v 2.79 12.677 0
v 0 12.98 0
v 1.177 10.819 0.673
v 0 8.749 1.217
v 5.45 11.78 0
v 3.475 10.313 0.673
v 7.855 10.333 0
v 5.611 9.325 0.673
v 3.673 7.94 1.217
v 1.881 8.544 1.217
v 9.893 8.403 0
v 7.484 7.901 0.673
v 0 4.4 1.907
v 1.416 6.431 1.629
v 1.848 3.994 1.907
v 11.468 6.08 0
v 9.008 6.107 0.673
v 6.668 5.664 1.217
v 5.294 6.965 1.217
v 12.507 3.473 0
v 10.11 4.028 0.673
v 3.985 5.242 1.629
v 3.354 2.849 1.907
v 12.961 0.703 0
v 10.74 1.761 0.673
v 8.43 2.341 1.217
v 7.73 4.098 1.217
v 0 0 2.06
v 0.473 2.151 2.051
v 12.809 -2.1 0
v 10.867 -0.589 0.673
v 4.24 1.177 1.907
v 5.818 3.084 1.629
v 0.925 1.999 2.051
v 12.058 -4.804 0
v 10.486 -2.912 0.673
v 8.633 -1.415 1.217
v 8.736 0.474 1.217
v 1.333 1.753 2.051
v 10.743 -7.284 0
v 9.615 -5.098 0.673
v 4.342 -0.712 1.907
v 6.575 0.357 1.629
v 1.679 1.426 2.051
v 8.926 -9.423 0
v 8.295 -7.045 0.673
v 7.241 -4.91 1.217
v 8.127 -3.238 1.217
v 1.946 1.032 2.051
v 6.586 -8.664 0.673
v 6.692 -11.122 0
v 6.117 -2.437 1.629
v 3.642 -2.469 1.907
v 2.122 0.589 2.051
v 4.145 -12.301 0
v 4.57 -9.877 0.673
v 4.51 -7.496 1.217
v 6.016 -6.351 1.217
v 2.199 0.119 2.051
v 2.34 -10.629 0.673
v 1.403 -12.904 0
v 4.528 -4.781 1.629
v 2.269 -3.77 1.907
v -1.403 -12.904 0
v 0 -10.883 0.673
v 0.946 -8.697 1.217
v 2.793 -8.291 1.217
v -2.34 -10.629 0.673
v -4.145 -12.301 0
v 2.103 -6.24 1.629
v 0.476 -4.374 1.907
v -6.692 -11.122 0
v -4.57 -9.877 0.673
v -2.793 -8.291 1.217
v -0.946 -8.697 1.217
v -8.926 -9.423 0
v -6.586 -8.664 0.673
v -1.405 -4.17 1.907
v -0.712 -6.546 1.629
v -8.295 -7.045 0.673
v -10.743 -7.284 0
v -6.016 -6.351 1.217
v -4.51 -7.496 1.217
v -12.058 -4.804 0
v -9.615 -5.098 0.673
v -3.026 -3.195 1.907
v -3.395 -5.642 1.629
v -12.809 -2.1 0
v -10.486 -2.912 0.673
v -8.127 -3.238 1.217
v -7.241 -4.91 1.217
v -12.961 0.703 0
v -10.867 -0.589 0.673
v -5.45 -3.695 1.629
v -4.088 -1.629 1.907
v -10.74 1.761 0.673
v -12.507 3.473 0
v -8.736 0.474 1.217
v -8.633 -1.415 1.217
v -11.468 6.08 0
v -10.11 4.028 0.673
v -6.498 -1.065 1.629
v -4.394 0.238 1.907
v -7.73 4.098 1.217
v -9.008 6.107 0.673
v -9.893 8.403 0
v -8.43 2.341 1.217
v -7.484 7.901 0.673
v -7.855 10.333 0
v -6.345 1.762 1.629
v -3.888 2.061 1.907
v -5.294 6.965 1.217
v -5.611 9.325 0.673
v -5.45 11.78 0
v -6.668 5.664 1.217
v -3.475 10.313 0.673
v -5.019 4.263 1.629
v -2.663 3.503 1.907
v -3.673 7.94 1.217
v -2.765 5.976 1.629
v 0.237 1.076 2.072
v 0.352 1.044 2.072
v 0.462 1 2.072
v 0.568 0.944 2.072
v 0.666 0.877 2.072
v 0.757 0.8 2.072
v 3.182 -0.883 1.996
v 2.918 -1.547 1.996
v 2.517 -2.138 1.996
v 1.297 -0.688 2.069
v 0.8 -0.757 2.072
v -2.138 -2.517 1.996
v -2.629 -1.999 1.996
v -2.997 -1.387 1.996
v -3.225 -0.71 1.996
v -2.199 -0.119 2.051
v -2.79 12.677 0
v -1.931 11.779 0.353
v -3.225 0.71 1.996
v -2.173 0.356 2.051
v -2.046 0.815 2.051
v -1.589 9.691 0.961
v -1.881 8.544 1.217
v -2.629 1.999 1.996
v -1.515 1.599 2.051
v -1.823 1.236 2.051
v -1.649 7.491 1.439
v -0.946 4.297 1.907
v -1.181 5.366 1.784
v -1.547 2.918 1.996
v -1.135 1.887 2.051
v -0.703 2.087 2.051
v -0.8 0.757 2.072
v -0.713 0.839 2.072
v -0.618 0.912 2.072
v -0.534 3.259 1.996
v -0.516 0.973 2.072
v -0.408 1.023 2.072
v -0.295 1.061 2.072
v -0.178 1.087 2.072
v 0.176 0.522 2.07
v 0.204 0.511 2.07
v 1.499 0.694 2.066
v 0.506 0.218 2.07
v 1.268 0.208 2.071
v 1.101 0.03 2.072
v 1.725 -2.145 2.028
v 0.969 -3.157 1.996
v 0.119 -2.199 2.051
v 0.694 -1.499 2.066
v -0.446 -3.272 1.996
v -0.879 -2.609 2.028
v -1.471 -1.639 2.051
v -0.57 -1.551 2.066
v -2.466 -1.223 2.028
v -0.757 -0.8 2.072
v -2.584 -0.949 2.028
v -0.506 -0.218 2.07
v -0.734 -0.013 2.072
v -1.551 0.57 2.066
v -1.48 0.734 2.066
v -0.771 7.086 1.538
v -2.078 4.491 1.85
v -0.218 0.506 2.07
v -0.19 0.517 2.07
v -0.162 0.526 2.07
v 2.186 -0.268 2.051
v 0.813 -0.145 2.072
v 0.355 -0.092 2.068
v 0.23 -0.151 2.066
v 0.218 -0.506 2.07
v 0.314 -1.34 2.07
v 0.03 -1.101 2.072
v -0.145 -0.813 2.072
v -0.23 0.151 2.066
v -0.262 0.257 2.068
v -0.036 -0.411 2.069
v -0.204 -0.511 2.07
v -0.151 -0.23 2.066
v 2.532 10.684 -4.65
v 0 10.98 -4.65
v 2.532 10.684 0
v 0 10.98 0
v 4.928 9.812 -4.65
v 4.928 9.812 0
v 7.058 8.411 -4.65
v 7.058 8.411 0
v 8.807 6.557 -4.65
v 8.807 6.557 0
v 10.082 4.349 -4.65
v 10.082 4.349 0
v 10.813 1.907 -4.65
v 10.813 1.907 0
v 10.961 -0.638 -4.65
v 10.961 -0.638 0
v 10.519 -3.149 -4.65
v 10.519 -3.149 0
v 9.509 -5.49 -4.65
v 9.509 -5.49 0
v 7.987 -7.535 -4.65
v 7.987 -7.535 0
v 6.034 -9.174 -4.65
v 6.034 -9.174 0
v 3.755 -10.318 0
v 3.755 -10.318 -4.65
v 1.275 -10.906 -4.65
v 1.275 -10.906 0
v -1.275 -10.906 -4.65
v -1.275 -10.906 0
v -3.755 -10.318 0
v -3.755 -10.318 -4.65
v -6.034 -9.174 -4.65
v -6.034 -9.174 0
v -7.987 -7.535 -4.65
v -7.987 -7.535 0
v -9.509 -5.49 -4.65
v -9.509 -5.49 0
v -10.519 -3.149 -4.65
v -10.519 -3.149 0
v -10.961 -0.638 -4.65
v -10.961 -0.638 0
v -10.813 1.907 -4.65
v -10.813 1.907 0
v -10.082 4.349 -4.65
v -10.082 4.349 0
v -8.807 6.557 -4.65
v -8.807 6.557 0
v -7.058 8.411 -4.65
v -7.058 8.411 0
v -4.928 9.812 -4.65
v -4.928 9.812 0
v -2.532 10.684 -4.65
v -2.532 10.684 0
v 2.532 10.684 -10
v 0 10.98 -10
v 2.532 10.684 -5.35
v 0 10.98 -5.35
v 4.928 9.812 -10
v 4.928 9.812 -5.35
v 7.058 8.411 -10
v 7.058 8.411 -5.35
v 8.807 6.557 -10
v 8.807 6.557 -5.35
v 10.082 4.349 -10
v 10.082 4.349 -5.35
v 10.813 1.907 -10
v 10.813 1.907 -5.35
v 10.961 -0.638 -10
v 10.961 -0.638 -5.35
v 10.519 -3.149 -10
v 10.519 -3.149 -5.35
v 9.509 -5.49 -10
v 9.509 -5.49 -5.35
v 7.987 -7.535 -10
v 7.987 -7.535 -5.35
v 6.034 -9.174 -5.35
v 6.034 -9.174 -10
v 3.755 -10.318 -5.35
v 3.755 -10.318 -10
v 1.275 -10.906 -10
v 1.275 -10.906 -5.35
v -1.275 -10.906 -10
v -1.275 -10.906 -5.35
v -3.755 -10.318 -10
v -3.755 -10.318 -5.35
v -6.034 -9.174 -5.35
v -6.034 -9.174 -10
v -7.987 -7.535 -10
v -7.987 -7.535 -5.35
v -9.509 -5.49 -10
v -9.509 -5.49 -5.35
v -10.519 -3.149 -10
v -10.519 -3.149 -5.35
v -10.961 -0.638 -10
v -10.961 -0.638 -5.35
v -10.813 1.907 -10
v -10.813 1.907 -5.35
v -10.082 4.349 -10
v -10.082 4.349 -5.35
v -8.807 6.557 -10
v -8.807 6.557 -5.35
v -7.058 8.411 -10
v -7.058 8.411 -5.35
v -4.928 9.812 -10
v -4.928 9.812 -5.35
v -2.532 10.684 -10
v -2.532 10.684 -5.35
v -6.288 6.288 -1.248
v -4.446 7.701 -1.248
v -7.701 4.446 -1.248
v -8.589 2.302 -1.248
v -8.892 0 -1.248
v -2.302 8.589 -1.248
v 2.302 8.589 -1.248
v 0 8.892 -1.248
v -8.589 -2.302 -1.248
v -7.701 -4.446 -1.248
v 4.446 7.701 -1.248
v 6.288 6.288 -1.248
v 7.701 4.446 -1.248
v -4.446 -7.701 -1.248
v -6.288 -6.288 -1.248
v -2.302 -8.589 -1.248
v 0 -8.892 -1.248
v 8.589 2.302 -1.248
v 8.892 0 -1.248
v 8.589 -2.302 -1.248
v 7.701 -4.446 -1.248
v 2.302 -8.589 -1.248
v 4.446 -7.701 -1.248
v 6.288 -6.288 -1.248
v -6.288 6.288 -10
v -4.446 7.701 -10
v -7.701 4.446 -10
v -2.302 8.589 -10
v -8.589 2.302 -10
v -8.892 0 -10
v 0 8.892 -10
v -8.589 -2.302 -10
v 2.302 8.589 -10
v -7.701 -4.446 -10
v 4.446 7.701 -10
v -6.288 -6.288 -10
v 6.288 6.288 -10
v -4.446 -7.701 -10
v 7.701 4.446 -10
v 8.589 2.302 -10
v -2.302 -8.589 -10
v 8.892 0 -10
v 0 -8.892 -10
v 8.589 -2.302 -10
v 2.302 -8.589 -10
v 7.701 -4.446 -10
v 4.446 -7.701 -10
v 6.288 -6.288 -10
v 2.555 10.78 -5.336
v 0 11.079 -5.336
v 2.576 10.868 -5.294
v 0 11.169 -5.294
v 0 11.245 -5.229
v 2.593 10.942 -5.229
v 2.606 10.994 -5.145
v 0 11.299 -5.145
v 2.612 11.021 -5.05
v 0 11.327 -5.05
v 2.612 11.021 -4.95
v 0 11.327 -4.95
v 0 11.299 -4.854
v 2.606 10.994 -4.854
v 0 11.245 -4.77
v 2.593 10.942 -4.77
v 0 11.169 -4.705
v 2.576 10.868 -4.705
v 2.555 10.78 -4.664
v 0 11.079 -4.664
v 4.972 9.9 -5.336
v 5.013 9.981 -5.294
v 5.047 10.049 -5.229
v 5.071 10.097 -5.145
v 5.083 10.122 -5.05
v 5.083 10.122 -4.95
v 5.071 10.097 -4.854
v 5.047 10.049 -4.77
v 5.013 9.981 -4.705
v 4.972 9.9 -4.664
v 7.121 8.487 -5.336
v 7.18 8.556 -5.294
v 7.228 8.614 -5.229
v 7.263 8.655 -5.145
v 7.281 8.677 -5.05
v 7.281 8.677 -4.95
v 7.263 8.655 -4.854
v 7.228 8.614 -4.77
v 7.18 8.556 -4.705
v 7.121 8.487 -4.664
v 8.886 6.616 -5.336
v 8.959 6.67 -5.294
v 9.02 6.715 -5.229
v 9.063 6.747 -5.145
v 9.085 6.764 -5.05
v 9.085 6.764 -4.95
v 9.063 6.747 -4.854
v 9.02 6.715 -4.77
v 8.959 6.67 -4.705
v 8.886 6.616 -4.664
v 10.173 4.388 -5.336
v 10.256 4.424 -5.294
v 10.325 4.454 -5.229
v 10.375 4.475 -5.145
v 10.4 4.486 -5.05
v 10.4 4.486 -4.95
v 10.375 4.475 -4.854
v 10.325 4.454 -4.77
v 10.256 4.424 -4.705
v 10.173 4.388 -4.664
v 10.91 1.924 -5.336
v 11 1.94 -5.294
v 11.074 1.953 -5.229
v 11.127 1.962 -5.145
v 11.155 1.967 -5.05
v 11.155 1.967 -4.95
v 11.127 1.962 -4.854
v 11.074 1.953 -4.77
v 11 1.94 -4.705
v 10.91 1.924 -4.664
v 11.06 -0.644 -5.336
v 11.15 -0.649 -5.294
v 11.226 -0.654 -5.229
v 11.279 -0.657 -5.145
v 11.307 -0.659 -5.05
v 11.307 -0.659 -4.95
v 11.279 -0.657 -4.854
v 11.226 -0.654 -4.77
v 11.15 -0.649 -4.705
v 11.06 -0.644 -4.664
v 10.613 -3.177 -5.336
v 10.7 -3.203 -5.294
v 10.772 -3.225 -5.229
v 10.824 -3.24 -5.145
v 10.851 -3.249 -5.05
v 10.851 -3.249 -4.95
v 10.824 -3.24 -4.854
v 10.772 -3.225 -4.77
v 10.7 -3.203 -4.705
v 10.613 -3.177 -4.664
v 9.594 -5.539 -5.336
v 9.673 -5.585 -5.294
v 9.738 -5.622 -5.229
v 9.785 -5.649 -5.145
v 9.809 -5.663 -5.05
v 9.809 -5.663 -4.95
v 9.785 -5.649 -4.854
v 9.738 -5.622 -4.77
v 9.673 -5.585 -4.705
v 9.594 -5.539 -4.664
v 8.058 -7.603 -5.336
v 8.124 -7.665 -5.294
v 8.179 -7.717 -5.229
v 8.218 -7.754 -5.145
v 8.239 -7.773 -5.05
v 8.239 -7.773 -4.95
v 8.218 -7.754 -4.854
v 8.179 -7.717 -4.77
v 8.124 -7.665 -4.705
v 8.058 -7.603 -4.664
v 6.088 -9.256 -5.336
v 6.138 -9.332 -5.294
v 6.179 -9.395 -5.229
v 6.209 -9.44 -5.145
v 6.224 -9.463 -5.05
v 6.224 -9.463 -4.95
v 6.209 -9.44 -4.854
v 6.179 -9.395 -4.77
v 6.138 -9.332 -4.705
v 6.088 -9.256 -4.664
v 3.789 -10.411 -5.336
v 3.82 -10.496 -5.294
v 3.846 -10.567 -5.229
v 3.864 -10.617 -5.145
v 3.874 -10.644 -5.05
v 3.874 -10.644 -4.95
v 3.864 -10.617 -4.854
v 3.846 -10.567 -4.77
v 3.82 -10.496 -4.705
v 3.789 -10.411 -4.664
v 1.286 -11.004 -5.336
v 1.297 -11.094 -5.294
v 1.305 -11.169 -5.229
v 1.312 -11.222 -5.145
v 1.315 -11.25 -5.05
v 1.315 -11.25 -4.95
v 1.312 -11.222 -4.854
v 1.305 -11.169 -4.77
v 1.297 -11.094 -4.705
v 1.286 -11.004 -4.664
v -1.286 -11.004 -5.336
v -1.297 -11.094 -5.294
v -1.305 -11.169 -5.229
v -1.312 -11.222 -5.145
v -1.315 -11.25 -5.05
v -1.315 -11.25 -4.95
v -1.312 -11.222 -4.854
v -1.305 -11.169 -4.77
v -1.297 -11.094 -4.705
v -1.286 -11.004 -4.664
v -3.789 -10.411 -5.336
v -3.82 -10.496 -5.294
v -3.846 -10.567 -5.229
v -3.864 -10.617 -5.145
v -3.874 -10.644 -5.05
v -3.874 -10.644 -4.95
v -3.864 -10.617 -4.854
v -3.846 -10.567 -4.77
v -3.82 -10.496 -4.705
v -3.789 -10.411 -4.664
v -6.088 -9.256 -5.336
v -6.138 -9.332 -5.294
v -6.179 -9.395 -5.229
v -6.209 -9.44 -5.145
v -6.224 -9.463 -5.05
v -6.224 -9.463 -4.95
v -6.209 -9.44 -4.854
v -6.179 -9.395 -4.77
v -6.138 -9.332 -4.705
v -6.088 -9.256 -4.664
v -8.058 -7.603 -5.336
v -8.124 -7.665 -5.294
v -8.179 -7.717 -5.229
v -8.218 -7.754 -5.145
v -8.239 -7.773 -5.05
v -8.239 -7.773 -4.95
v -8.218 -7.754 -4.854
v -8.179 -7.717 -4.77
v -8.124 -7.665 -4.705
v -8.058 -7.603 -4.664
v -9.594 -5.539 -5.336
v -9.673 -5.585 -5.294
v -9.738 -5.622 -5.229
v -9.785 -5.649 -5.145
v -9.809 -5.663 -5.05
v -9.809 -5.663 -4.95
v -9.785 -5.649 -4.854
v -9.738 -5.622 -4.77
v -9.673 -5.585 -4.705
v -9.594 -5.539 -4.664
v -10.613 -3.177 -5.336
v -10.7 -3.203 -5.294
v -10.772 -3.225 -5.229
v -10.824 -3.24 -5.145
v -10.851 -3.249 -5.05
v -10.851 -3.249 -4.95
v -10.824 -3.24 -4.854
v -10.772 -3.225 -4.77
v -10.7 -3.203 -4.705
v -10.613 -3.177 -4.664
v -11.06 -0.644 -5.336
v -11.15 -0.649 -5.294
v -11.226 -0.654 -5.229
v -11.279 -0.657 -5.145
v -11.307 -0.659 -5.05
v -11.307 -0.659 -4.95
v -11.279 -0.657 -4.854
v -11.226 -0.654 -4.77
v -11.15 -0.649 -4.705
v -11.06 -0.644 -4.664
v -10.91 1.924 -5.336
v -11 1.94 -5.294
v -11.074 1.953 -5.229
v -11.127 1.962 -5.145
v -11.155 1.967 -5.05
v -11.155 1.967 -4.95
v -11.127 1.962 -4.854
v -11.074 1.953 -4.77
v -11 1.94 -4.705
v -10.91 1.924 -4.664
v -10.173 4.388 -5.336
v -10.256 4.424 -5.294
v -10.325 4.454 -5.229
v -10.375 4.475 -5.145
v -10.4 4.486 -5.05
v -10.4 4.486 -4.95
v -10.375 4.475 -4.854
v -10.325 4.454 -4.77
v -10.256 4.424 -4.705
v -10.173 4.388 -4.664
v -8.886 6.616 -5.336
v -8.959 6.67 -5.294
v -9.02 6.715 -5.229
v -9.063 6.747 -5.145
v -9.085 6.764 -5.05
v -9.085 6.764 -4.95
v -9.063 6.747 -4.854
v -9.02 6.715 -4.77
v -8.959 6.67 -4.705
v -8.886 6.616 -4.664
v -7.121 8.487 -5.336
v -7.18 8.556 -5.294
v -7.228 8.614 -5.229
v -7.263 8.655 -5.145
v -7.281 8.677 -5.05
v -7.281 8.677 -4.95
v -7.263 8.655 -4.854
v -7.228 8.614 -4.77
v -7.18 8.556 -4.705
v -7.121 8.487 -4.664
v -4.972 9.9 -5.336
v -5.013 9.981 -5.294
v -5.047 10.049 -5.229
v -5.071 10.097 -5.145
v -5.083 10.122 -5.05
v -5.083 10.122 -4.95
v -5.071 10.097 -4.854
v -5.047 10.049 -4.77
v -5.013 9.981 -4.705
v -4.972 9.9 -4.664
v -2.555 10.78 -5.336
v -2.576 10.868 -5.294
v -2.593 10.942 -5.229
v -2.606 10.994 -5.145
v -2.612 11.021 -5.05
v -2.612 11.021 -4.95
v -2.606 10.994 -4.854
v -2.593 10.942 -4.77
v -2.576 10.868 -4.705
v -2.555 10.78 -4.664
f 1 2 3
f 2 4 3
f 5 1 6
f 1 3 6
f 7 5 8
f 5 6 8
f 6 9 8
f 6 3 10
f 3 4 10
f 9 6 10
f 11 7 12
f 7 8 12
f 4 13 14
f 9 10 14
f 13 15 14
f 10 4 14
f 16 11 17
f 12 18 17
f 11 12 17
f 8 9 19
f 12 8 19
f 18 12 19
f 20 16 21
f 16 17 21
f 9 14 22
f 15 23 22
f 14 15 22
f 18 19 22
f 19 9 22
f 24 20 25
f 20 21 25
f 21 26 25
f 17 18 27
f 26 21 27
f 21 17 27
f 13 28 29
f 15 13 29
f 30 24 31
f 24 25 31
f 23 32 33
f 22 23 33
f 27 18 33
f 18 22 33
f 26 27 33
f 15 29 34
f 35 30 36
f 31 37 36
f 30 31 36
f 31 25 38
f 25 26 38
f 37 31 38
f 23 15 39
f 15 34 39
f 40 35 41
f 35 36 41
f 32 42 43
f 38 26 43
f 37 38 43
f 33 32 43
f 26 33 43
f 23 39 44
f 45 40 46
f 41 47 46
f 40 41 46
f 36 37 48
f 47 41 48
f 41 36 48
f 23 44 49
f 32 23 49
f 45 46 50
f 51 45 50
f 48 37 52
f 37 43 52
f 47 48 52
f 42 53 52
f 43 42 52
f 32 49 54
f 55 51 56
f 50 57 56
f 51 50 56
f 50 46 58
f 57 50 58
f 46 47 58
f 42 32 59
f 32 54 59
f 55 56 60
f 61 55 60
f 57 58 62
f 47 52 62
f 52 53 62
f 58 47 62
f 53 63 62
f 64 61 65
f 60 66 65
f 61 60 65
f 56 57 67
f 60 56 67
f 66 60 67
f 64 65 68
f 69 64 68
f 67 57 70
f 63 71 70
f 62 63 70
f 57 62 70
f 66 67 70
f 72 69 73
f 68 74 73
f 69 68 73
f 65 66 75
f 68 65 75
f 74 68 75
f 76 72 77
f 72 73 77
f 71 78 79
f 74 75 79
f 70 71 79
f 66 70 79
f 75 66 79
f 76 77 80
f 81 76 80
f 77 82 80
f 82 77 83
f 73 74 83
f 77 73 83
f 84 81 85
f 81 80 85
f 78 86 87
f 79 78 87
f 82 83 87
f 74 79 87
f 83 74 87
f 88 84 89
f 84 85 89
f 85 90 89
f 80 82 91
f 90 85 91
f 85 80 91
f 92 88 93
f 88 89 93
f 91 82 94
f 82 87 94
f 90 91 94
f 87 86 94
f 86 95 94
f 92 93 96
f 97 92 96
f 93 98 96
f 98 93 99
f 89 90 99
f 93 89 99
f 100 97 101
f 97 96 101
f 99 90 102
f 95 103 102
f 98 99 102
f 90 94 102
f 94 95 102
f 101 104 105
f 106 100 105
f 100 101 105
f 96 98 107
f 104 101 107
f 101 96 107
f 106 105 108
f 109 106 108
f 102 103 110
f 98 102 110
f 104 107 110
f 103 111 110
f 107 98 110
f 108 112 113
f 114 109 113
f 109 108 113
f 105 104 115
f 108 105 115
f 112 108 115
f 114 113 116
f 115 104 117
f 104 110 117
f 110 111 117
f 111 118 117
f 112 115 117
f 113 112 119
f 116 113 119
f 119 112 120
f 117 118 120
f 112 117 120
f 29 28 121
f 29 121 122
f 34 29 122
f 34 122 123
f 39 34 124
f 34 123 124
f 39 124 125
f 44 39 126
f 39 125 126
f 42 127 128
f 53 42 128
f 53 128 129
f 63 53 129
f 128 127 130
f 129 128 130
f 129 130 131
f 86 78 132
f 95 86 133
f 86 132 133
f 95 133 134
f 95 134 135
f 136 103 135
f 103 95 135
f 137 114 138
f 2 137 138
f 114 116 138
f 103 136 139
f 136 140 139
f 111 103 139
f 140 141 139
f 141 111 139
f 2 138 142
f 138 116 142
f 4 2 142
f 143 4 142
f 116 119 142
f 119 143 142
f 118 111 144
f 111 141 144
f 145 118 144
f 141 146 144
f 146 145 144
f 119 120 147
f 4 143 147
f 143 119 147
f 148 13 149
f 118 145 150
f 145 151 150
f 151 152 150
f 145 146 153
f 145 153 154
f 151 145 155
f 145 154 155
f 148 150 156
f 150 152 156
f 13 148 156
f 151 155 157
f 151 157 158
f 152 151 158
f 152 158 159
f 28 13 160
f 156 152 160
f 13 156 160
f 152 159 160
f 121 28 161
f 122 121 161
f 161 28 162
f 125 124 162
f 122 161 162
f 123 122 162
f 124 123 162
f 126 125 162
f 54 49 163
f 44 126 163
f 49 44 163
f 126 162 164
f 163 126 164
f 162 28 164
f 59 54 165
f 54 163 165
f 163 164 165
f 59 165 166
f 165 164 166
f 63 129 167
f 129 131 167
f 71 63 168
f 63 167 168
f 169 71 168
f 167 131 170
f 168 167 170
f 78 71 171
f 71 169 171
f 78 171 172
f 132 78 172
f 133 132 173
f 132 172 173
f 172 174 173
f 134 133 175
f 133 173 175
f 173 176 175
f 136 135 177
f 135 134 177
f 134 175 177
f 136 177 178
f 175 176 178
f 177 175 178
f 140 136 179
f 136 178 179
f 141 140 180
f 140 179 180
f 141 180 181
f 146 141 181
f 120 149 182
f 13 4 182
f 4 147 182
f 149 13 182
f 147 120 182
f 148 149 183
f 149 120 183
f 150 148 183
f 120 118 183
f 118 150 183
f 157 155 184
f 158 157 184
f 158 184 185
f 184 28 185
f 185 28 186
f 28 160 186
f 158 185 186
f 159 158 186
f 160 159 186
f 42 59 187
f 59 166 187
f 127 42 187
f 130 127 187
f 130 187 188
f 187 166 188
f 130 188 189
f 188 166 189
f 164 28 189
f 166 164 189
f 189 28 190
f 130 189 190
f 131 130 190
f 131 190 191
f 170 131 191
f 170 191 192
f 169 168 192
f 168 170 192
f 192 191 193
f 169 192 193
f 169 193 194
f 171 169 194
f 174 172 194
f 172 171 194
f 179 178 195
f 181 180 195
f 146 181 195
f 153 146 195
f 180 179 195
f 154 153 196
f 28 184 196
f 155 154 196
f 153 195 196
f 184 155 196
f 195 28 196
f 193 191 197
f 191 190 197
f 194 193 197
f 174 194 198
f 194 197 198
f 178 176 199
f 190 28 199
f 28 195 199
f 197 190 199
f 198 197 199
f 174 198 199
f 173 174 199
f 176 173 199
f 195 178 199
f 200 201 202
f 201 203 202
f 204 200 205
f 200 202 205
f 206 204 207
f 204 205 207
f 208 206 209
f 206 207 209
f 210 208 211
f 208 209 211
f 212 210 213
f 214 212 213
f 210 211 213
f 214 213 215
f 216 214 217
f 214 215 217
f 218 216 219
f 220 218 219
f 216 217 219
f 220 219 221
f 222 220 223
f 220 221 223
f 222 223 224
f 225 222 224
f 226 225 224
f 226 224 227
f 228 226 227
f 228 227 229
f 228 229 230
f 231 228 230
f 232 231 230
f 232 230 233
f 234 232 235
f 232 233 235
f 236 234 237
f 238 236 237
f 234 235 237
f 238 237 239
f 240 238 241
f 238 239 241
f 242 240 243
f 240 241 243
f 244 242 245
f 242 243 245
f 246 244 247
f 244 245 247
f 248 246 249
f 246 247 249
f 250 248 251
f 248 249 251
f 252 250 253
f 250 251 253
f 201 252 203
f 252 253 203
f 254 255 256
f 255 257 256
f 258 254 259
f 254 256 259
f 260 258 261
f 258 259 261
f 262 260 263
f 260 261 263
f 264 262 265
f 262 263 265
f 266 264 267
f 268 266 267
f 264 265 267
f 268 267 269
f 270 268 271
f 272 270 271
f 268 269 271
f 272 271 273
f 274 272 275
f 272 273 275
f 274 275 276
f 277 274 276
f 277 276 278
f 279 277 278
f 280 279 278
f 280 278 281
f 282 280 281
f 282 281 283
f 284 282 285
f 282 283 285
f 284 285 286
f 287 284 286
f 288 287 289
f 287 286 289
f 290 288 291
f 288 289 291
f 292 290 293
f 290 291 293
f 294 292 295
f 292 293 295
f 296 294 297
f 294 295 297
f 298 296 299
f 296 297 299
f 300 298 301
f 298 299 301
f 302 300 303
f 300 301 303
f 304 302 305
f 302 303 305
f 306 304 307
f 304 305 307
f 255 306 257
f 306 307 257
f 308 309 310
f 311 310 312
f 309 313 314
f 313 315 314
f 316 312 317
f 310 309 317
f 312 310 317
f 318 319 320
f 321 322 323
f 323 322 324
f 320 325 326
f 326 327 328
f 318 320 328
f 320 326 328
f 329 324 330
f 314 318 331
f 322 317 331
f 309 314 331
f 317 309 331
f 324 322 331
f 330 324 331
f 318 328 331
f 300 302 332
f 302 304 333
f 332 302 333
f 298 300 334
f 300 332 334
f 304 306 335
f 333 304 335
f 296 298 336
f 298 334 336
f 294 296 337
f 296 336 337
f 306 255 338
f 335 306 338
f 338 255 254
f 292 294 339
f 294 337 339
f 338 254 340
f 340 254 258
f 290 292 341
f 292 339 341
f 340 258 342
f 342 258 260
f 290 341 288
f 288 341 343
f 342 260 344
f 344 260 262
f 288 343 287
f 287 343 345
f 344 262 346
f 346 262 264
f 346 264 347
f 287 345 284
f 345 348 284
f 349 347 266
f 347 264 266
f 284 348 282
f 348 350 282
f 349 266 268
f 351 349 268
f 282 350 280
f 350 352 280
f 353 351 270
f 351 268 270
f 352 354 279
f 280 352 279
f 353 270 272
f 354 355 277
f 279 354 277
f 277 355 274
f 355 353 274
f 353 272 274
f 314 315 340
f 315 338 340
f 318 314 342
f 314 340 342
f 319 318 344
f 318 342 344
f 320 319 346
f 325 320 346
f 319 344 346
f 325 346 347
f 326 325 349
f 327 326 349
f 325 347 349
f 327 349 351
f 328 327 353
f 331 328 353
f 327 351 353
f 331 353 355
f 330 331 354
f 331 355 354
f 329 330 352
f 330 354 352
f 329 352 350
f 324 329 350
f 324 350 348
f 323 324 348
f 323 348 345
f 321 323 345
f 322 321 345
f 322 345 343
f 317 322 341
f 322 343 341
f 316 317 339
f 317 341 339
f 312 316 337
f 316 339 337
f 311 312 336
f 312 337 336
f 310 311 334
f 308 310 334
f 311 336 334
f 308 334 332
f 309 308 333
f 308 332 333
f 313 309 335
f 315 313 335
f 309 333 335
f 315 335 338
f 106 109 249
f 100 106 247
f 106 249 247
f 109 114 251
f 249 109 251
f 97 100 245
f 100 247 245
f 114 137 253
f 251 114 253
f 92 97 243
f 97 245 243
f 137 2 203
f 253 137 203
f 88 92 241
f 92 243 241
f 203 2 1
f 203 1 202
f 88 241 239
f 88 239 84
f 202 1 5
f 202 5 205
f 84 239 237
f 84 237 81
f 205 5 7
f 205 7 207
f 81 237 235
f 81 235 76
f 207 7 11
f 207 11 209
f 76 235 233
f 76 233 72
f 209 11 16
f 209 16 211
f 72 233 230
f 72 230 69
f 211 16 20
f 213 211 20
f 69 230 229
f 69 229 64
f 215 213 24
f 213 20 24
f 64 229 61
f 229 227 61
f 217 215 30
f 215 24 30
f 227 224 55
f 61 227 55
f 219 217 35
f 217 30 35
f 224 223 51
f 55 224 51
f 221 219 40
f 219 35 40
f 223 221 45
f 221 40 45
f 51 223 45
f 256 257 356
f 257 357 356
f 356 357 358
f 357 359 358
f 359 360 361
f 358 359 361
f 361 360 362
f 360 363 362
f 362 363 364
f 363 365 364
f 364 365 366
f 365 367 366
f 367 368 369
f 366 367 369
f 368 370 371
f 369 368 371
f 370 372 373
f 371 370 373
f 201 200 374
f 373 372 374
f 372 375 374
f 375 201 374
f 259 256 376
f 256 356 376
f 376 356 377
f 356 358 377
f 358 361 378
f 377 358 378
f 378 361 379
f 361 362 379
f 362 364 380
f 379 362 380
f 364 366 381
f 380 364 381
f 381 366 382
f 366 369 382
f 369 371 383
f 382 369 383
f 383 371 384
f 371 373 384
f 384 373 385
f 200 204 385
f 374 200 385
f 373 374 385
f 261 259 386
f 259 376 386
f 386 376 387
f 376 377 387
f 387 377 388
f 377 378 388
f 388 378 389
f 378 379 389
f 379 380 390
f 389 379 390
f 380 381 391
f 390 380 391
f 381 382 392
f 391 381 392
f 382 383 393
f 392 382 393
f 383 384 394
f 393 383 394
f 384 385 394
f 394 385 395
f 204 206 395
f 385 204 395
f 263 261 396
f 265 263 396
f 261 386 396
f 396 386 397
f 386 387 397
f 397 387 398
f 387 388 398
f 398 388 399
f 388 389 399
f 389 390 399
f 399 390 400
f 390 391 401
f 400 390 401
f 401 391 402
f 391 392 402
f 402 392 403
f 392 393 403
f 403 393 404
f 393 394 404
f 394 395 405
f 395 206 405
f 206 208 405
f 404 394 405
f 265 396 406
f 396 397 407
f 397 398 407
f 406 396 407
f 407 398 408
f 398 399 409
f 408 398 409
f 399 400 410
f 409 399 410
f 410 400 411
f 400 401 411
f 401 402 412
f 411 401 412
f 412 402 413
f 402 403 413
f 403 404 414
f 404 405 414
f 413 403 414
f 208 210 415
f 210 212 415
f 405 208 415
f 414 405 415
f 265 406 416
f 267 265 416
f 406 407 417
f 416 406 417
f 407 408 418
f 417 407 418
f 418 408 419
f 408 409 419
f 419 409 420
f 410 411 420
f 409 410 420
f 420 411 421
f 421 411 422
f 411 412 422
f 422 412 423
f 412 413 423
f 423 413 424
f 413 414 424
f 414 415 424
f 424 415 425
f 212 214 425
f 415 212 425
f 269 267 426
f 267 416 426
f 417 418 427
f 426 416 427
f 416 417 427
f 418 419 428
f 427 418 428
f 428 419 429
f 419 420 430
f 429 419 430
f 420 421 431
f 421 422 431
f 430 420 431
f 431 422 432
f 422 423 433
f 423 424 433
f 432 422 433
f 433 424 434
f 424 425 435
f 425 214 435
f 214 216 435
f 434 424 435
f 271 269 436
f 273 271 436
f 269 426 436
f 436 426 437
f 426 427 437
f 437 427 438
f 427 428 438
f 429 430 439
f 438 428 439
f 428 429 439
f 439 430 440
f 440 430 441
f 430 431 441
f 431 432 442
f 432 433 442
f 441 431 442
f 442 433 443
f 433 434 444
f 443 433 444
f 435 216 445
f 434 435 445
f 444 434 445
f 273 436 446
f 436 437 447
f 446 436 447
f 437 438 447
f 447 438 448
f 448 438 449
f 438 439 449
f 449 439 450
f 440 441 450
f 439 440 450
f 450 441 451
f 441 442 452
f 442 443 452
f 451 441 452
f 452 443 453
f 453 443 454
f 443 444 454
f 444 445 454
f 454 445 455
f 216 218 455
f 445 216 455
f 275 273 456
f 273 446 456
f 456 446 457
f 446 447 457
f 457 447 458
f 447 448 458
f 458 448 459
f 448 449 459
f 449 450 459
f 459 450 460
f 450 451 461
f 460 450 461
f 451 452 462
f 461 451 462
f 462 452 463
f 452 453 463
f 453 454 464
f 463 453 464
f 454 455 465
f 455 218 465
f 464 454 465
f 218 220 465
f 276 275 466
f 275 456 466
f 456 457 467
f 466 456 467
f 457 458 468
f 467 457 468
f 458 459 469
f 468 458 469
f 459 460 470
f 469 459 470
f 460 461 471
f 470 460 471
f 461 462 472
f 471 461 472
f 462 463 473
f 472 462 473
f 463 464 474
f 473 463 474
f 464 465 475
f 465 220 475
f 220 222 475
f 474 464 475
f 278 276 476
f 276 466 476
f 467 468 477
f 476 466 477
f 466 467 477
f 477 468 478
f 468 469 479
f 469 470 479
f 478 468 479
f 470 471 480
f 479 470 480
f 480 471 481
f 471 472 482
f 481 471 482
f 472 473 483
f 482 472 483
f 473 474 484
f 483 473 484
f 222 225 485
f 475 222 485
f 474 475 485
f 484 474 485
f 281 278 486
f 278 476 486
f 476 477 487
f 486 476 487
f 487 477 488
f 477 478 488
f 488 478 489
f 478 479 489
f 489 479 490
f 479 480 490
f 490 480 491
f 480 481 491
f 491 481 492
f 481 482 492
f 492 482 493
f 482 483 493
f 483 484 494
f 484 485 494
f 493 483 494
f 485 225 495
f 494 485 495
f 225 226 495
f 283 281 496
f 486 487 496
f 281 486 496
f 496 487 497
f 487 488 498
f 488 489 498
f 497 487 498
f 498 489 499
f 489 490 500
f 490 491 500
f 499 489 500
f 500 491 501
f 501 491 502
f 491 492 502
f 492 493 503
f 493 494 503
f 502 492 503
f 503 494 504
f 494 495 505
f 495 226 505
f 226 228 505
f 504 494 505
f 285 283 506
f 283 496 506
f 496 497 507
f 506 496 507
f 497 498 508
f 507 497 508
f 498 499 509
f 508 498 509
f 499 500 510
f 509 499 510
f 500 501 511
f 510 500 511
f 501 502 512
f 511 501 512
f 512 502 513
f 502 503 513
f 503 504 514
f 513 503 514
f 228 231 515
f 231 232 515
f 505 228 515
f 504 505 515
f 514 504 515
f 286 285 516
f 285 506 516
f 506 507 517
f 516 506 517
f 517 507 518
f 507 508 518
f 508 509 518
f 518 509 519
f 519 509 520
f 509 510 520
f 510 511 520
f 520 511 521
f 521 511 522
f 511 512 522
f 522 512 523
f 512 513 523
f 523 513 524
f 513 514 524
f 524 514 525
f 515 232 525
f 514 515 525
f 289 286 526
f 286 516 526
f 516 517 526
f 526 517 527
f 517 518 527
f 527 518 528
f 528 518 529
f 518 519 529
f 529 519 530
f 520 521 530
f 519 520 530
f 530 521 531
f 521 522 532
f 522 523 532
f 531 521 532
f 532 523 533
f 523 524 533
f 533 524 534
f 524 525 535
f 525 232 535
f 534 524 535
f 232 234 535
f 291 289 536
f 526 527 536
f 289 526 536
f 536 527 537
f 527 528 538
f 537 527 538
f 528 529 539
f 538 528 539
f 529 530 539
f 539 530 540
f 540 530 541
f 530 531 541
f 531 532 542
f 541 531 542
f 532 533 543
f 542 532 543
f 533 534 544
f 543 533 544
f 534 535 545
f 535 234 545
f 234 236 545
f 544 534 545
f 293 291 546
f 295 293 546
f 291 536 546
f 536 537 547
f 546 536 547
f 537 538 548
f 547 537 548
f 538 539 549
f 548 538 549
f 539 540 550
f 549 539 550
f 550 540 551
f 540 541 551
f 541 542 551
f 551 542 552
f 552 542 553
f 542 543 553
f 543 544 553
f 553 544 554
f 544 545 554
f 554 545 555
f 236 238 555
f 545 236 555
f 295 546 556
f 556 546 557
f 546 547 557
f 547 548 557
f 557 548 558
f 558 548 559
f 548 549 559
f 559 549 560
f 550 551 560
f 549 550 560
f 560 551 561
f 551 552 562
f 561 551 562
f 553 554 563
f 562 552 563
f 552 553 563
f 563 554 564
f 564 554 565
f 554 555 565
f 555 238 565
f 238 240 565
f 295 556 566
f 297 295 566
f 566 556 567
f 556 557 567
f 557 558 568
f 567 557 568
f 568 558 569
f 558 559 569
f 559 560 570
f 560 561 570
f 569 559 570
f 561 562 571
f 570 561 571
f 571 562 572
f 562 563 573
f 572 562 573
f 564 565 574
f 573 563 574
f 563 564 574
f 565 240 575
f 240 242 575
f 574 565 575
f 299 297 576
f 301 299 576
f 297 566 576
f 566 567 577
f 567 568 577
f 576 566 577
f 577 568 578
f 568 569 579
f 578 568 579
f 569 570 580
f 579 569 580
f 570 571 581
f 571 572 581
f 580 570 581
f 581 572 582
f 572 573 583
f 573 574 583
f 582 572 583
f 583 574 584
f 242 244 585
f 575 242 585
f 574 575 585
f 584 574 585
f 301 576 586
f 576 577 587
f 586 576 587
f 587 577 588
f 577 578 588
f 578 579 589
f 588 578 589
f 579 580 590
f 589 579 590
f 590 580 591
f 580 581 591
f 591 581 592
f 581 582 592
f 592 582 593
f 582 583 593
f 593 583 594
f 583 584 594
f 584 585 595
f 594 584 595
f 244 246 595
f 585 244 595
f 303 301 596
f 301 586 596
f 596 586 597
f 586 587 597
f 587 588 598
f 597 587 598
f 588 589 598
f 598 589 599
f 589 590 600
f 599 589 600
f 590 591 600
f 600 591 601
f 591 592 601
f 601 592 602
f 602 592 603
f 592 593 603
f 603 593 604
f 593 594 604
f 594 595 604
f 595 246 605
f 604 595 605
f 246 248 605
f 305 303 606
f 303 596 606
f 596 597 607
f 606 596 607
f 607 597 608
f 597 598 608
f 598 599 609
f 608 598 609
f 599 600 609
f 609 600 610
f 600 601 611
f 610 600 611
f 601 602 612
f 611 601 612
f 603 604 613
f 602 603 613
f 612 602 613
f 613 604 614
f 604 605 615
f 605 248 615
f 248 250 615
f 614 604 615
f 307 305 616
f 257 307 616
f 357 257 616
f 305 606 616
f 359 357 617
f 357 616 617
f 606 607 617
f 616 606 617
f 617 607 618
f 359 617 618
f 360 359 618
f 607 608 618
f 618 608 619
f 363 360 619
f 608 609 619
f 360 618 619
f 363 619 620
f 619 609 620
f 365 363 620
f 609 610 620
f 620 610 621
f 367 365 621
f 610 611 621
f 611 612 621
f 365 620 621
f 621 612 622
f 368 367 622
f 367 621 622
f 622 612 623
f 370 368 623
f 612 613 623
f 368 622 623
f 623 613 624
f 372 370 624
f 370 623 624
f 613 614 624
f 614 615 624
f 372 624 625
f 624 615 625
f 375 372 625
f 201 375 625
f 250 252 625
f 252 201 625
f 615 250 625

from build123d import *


with BuildPart() as f1:
    # F0 (on Right) → F1 (revolve)
    with BuildSketch(Plane.YZ):
        with BuildLine():
            Line((10.98, -4.649603), (10.98, 0))
            Line((10.98, 0), (12.98, 0))
            ThreePointArc((12.98, 0), (6.584993, 1.628545), (0, 2.06))
            Line((0, 2.06), (0, -1.247563))
            Line((0, -1.247563), (8.892437, -1.247563))
            Line((8.892437, -1.247563), (8.892437, -10))
            Line((8.892437, -10), (10.98, -10))
            Line((10.98, -10), (10.98, -5.35))
            Line((10.98, -5.35), (10.98, -4.649603))
        make_face()
        with BuildLine():
            ThreePointArc((10.98, -5.35), (11.330199, -4.999801), (10.98, -4.649603))
            Line((10.98, -4.649603), (10.98, -5.35))
        make_face()
    revolve(axis=Axis((0, 0, 0.406218), (0, 0, -1)))


solid = f1.part
